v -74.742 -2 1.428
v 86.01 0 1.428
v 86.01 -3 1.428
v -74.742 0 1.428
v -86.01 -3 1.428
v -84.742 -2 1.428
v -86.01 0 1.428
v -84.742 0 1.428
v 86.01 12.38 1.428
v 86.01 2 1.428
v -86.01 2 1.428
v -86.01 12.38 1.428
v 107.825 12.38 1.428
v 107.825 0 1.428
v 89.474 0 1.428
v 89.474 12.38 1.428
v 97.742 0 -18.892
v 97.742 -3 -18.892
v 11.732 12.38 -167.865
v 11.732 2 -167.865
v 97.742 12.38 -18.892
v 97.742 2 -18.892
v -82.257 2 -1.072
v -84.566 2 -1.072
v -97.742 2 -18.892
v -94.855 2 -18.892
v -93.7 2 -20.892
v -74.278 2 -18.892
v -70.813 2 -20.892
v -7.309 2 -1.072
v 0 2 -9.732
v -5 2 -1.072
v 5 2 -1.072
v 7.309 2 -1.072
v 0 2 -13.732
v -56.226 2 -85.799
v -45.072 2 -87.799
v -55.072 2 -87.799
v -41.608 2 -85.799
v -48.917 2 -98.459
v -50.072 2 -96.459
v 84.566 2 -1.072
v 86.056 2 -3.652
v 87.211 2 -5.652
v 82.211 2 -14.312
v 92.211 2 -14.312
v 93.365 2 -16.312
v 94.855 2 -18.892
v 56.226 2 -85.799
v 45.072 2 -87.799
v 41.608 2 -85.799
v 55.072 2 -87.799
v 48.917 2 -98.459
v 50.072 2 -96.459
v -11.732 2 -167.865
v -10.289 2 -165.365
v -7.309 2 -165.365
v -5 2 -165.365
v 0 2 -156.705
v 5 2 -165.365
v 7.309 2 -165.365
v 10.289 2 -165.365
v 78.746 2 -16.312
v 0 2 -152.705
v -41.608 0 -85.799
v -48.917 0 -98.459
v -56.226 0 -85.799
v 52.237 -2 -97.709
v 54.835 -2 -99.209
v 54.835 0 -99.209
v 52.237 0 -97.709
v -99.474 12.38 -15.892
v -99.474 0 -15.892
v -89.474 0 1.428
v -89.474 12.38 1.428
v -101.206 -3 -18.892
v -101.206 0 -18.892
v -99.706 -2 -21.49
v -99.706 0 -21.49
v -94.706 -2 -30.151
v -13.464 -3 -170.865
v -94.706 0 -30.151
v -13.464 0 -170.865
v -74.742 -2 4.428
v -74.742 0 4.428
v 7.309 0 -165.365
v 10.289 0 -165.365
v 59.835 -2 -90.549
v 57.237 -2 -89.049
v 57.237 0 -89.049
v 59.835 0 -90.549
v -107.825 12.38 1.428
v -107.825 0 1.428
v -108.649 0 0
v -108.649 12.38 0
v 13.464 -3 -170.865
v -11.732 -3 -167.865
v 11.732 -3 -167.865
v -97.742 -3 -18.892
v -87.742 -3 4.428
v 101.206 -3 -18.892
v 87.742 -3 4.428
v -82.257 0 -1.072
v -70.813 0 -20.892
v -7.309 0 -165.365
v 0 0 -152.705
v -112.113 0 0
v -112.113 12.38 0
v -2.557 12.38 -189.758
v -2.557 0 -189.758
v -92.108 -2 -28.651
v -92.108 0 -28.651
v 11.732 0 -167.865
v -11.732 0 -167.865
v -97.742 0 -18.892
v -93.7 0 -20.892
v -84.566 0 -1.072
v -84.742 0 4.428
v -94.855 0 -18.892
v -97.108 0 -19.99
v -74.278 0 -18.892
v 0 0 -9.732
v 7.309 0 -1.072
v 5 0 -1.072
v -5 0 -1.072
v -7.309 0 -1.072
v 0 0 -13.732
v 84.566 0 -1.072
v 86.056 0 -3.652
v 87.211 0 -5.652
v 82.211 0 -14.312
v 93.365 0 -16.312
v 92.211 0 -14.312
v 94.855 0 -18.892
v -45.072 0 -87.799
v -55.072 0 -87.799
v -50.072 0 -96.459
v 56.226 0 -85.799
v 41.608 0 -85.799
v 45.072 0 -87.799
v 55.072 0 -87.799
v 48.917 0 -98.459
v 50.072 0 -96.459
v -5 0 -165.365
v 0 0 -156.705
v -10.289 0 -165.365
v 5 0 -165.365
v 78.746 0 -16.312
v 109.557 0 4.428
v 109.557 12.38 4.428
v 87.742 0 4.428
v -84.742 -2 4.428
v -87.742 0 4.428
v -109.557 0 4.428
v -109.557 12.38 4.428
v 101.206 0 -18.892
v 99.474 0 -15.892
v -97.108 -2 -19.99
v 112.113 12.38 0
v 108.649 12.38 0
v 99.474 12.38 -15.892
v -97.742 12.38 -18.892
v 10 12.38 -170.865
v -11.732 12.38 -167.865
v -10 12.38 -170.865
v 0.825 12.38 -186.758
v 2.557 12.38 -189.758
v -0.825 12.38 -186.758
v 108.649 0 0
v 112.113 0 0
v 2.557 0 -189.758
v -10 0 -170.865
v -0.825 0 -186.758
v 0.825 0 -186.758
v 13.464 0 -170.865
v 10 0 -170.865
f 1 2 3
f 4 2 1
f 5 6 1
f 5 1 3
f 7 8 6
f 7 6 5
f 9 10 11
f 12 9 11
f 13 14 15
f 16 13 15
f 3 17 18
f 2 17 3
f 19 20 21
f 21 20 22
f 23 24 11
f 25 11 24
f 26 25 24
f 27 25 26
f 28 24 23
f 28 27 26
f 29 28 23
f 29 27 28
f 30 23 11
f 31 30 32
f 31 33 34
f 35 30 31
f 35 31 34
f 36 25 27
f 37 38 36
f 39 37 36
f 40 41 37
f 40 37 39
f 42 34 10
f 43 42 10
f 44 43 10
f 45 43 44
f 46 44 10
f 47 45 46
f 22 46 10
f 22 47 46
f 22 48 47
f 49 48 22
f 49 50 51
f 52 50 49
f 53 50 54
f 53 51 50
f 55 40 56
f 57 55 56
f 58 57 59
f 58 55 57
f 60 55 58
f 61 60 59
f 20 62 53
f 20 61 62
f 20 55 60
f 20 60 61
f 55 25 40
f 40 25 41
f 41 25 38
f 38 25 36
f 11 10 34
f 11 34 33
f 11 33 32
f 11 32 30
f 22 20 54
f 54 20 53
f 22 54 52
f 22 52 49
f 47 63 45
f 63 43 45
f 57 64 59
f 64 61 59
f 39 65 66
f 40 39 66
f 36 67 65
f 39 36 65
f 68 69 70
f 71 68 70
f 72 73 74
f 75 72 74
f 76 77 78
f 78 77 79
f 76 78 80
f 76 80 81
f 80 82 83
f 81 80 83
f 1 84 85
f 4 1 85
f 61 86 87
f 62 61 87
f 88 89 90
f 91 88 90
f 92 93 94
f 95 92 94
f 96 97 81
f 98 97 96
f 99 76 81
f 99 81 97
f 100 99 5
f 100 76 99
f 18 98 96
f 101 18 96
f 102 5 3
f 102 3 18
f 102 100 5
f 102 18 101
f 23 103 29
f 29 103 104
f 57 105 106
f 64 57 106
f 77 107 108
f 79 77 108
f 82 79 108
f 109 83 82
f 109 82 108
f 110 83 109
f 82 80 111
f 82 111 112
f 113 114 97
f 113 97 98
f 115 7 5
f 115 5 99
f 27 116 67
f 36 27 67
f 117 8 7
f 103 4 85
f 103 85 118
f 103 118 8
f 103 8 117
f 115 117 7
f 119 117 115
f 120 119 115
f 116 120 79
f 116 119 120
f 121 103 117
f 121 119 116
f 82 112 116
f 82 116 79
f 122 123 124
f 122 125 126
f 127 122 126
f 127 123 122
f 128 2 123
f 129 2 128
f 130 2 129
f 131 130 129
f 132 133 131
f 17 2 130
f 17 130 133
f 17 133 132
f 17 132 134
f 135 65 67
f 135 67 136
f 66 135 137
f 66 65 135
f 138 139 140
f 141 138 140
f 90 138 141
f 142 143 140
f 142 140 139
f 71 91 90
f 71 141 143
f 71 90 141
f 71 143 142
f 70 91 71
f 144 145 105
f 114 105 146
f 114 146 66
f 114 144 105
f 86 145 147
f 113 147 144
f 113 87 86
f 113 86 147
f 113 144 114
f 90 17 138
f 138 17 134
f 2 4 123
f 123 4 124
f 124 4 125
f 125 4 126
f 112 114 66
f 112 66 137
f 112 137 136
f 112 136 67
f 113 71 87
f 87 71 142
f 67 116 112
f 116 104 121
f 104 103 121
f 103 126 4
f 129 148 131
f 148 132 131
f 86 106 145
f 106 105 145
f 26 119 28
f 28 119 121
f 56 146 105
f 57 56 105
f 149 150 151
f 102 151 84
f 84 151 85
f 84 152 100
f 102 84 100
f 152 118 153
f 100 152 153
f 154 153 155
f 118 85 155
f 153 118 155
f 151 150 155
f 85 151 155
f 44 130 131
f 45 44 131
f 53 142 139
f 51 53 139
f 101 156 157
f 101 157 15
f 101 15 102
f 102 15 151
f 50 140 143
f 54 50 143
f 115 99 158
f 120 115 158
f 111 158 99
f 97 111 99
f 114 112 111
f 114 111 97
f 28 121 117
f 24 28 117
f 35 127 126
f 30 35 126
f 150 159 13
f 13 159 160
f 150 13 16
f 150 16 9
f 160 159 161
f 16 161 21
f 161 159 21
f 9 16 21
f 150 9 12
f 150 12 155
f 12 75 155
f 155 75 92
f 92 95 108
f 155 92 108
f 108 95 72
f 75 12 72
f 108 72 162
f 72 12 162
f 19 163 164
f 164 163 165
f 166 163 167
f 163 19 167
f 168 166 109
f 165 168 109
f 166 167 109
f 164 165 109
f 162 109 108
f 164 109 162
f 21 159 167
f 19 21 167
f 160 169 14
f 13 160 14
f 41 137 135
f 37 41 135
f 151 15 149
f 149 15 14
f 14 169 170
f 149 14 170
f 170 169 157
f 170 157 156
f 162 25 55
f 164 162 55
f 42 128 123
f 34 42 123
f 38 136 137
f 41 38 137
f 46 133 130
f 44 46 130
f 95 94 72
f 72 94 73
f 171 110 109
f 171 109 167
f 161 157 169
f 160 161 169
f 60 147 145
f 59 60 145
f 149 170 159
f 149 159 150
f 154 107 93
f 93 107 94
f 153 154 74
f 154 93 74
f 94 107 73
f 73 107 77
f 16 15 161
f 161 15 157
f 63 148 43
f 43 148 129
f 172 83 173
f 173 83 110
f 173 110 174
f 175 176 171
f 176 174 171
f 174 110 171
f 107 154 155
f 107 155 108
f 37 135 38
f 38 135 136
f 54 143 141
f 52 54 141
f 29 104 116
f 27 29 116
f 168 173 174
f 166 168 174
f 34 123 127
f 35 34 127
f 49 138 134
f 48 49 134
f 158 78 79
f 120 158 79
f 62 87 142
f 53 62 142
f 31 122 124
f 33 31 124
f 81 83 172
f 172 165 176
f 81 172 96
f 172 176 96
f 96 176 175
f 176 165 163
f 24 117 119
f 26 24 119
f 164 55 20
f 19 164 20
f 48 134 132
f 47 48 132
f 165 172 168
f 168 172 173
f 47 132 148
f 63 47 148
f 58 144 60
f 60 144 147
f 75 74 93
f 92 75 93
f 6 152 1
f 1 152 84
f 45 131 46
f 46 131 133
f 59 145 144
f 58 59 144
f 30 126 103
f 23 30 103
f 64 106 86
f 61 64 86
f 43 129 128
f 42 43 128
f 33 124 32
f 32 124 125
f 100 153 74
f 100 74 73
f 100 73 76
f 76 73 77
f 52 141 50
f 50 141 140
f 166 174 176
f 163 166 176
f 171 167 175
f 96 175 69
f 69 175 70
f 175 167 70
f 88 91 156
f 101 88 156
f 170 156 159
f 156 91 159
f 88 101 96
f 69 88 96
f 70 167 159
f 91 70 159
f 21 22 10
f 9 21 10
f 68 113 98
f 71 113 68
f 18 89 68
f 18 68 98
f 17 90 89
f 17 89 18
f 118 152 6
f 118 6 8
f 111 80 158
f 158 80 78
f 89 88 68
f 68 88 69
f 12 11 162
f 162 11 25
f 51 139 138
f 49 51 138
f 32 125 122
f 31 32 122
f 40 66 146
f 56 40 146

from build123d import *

# Parameters (mm, degrees)
BOSS_EXTRUDE1_DEPTH = 12.38
BOSS_EXTRUDE2_DEPTH = 2
BOSS_EXTRUDE3_DEPTH = 3
SKETCH4_W           = 10
SKETCH4_H           = 2
CUT_EXTRUDE1_DEPTH  = 6
SKETCH5_W           = 10
SKETCH5_H           = 2
CUT_EXTRUDE2_DEPTH  = 6
SKETCH6_W           = 10
SKETCH6_H           = 2
CUT_EXTRUDE3_DEPTH  = 6


with BuildPart() as part:
    # Sketch1 → Boss-Extrude1 (new body)
    with BuildSketch(Plane(origin=(0, 0, 0), x_dir=(1, 0, 0), z_dir=(0, 1, 0))):
        Polygon((109.556624327, -4.42820323), (-109.556624327, -4.42820323), (-112.113248654, 0), (-2.55662435, 189.757639654), (2.556624303, 189.757639654), (112.113248654, 0), align=None)
        Polygon((-107.82457352, -1.42820323), (-108.649147039, 0), (-99.473720558, 15.892304845), (-89.473720559, -1.42820323), align=None, mode=Mode.SUBTRACT)
        Polygon((-0.824573543, 186.757639627), (0.824573481, 186.757639627), (9.999999979, 170.86533478), (-10.000000021, 170.86533478), align=None, mode=Mode.SUBTRACT)
        Polygon((108.649147039, 0), (107.82457353, -1.428203222), (89.473720569, -1.428203222), (99.473720569, 15.892304853), align=None, mode=Mode.SUBTRACT)
        Polygon((-11.732050803, 167.865334802), (11.732050803, 167.865334802), (97.741669765, 18.89230486), (86.00961895, -1.428203229), (-86.009618944, -1.428203229), (-97.741669751, 18.892304845), align=None, mode=Mode.SUBTRACT)
    extrude(amount=BOSS_EXTRUDE1_DEPTH)

    # Sketch1<4> → Boss-Extrude2 (add)
    with BuildSketch(Plane(origin=(0, 0, 0), x_dir=(1, 0, 0), z_dir=(0, 1, 0))):
        Polygon((11.732050803, 167.865334802), (-11.732050803, 167.865334802), (-97.741669751, 18.892304845), (-86.009618944, -1.428203229), (86.00961895, -1.428203229), (97.741669765, 18.89230486), align=None)
        Polygon((-84.566243256, 1.071796796), (-94.854918378, 18.892304849), (-74.277568135, 18.892304849), align=None, mode=Mode.SUBTRACT)
        Polygon((-1e-08, 9.732050841), (4.99999999, 1.071796803), (-5.00000001, 1.071796803), align=None, mode=Mode.SUBTRACT)
        Polygon((-45.071796745, 87.798692801), (-55.071796745, 87.798692801), (-50.071796745, 96.458946839), align=None, mode=Mode.SUBTRACT)
        Polygon((82.210580848, 14.312177834), (92.210580848, 14.312177834), (87.210580848, 5.651923796), align=None, mode=Mode.SUBTRACT)
        Polygon((48.91709624, 98.458946834), (41.607695163, 85.798692796), (56.226497316, 85.798692796), (94.854918412, 18.892304841), (93.36528139, 16.312177834), (78.746479233, 16.312177834), (86.055880312, 3.651923793), (84.566243293, 1.071796793), (7.309401088, 1.071796793), (2e-09, 13.732050847), (-7.309401083, 1.071796796), (-82.256842179, 1.071796796), (-70.813466519, 20.892304849), (-93.70021784, 20.892304849), (-56.226497283, 85.798692801), (-41.60769513, 85.798692801), (-48.917096207, 98.458946839), (-10.288675112, 165.365334792), (-7.309401077, 165.365334792), (0, 152.705080754), (7.309401077, 165.365334792), (10.288675142, 165.365334792), align=None, mode=Mode.SUBTRACT)
        Polygon((45.071796778, 87.798692803), (50.071796778, 96.458946841), (55.071796778, 87.798692803), align=None, mode=Mode.SUBTRACT)
        Polygon((0, 156.705080761), (-5, 165.365334799), (5, 165.365334799), align=None, mode=Mode.SUBTRACT)
    extrude(amount=BOSS_EXTRUDE2_DEPTH)

    # Sketch2 → Boss-Extrude3 (add)
    with BuildSketch(Plane.XZ):
        Polygon((101.205771363, -18.892304847), (87.741669751, 4.42820323), (-87.741669751, 4.42820323), (-101.205771368, -18.892304847), (-13.464101652, -170.86533478), (13.464101609, -170.86533478), align=None)
        Polygon((-11.732050819, -167.865334802), (11.732050795, -167.865334802), (97.741669739, -18.892304852), (86.009618931, 1.42820323), (-86.009618931, 1.42820323), (-97.741669763, -18.892304852), align=None, mode=Mode.SUBTRACT)
    extrude(amount=BOSS_EXTRUDE3_DEPTH)

    # Sketch4 → Cut-Extrude1 (cut)
    with BuildSketch(Plane.XY.offset(4.42820323)):
        with Locations((-79.741669751, -1)):
            Rectangle(SKETCH4_W, SKETCH4_H)
    extrude(amount=-CUT_EXTRUDE1_DEPTH, mode=Mode.SUBTRACT)

    # Sketch5 → Cut-Extrude2 (cut)
    with BuildSketch(Plane(origin=(-84.084936503, 0, -48.546460711), x_dir=(-0.4999999998935114, 0, 0.86602540384592), z_dir=(-0.86602540384592, 0, -0.4999999998935114))):
        with Locations((26.241669739, -1)):
            Rectangle(SKETCH5_W, SKETCH5_H)
    extrude(amount=-CUT_EXTRUDE2_DEPTH, mode=Mode.SUBTRACT)

    # Sketch6 → Cut-Extrude3 (cut)
    with BuildSketch(Plane(origin=(84.084936484, 0, -48.546460721), x_dir=(-0.5000000000540236, 0, -0.8660254037532481), z_dir=(0.8660254037532481, 0, -0.5000000000540236))):
        with Locations((53.499999991, -1)):
            Rectangle(SKETCH6_W, SKETCH6_H)
    extrude(amount=-CUT_EXTRUDE3_DEPTH, mode=Mode.SUBTRACT)


solid = part.part
